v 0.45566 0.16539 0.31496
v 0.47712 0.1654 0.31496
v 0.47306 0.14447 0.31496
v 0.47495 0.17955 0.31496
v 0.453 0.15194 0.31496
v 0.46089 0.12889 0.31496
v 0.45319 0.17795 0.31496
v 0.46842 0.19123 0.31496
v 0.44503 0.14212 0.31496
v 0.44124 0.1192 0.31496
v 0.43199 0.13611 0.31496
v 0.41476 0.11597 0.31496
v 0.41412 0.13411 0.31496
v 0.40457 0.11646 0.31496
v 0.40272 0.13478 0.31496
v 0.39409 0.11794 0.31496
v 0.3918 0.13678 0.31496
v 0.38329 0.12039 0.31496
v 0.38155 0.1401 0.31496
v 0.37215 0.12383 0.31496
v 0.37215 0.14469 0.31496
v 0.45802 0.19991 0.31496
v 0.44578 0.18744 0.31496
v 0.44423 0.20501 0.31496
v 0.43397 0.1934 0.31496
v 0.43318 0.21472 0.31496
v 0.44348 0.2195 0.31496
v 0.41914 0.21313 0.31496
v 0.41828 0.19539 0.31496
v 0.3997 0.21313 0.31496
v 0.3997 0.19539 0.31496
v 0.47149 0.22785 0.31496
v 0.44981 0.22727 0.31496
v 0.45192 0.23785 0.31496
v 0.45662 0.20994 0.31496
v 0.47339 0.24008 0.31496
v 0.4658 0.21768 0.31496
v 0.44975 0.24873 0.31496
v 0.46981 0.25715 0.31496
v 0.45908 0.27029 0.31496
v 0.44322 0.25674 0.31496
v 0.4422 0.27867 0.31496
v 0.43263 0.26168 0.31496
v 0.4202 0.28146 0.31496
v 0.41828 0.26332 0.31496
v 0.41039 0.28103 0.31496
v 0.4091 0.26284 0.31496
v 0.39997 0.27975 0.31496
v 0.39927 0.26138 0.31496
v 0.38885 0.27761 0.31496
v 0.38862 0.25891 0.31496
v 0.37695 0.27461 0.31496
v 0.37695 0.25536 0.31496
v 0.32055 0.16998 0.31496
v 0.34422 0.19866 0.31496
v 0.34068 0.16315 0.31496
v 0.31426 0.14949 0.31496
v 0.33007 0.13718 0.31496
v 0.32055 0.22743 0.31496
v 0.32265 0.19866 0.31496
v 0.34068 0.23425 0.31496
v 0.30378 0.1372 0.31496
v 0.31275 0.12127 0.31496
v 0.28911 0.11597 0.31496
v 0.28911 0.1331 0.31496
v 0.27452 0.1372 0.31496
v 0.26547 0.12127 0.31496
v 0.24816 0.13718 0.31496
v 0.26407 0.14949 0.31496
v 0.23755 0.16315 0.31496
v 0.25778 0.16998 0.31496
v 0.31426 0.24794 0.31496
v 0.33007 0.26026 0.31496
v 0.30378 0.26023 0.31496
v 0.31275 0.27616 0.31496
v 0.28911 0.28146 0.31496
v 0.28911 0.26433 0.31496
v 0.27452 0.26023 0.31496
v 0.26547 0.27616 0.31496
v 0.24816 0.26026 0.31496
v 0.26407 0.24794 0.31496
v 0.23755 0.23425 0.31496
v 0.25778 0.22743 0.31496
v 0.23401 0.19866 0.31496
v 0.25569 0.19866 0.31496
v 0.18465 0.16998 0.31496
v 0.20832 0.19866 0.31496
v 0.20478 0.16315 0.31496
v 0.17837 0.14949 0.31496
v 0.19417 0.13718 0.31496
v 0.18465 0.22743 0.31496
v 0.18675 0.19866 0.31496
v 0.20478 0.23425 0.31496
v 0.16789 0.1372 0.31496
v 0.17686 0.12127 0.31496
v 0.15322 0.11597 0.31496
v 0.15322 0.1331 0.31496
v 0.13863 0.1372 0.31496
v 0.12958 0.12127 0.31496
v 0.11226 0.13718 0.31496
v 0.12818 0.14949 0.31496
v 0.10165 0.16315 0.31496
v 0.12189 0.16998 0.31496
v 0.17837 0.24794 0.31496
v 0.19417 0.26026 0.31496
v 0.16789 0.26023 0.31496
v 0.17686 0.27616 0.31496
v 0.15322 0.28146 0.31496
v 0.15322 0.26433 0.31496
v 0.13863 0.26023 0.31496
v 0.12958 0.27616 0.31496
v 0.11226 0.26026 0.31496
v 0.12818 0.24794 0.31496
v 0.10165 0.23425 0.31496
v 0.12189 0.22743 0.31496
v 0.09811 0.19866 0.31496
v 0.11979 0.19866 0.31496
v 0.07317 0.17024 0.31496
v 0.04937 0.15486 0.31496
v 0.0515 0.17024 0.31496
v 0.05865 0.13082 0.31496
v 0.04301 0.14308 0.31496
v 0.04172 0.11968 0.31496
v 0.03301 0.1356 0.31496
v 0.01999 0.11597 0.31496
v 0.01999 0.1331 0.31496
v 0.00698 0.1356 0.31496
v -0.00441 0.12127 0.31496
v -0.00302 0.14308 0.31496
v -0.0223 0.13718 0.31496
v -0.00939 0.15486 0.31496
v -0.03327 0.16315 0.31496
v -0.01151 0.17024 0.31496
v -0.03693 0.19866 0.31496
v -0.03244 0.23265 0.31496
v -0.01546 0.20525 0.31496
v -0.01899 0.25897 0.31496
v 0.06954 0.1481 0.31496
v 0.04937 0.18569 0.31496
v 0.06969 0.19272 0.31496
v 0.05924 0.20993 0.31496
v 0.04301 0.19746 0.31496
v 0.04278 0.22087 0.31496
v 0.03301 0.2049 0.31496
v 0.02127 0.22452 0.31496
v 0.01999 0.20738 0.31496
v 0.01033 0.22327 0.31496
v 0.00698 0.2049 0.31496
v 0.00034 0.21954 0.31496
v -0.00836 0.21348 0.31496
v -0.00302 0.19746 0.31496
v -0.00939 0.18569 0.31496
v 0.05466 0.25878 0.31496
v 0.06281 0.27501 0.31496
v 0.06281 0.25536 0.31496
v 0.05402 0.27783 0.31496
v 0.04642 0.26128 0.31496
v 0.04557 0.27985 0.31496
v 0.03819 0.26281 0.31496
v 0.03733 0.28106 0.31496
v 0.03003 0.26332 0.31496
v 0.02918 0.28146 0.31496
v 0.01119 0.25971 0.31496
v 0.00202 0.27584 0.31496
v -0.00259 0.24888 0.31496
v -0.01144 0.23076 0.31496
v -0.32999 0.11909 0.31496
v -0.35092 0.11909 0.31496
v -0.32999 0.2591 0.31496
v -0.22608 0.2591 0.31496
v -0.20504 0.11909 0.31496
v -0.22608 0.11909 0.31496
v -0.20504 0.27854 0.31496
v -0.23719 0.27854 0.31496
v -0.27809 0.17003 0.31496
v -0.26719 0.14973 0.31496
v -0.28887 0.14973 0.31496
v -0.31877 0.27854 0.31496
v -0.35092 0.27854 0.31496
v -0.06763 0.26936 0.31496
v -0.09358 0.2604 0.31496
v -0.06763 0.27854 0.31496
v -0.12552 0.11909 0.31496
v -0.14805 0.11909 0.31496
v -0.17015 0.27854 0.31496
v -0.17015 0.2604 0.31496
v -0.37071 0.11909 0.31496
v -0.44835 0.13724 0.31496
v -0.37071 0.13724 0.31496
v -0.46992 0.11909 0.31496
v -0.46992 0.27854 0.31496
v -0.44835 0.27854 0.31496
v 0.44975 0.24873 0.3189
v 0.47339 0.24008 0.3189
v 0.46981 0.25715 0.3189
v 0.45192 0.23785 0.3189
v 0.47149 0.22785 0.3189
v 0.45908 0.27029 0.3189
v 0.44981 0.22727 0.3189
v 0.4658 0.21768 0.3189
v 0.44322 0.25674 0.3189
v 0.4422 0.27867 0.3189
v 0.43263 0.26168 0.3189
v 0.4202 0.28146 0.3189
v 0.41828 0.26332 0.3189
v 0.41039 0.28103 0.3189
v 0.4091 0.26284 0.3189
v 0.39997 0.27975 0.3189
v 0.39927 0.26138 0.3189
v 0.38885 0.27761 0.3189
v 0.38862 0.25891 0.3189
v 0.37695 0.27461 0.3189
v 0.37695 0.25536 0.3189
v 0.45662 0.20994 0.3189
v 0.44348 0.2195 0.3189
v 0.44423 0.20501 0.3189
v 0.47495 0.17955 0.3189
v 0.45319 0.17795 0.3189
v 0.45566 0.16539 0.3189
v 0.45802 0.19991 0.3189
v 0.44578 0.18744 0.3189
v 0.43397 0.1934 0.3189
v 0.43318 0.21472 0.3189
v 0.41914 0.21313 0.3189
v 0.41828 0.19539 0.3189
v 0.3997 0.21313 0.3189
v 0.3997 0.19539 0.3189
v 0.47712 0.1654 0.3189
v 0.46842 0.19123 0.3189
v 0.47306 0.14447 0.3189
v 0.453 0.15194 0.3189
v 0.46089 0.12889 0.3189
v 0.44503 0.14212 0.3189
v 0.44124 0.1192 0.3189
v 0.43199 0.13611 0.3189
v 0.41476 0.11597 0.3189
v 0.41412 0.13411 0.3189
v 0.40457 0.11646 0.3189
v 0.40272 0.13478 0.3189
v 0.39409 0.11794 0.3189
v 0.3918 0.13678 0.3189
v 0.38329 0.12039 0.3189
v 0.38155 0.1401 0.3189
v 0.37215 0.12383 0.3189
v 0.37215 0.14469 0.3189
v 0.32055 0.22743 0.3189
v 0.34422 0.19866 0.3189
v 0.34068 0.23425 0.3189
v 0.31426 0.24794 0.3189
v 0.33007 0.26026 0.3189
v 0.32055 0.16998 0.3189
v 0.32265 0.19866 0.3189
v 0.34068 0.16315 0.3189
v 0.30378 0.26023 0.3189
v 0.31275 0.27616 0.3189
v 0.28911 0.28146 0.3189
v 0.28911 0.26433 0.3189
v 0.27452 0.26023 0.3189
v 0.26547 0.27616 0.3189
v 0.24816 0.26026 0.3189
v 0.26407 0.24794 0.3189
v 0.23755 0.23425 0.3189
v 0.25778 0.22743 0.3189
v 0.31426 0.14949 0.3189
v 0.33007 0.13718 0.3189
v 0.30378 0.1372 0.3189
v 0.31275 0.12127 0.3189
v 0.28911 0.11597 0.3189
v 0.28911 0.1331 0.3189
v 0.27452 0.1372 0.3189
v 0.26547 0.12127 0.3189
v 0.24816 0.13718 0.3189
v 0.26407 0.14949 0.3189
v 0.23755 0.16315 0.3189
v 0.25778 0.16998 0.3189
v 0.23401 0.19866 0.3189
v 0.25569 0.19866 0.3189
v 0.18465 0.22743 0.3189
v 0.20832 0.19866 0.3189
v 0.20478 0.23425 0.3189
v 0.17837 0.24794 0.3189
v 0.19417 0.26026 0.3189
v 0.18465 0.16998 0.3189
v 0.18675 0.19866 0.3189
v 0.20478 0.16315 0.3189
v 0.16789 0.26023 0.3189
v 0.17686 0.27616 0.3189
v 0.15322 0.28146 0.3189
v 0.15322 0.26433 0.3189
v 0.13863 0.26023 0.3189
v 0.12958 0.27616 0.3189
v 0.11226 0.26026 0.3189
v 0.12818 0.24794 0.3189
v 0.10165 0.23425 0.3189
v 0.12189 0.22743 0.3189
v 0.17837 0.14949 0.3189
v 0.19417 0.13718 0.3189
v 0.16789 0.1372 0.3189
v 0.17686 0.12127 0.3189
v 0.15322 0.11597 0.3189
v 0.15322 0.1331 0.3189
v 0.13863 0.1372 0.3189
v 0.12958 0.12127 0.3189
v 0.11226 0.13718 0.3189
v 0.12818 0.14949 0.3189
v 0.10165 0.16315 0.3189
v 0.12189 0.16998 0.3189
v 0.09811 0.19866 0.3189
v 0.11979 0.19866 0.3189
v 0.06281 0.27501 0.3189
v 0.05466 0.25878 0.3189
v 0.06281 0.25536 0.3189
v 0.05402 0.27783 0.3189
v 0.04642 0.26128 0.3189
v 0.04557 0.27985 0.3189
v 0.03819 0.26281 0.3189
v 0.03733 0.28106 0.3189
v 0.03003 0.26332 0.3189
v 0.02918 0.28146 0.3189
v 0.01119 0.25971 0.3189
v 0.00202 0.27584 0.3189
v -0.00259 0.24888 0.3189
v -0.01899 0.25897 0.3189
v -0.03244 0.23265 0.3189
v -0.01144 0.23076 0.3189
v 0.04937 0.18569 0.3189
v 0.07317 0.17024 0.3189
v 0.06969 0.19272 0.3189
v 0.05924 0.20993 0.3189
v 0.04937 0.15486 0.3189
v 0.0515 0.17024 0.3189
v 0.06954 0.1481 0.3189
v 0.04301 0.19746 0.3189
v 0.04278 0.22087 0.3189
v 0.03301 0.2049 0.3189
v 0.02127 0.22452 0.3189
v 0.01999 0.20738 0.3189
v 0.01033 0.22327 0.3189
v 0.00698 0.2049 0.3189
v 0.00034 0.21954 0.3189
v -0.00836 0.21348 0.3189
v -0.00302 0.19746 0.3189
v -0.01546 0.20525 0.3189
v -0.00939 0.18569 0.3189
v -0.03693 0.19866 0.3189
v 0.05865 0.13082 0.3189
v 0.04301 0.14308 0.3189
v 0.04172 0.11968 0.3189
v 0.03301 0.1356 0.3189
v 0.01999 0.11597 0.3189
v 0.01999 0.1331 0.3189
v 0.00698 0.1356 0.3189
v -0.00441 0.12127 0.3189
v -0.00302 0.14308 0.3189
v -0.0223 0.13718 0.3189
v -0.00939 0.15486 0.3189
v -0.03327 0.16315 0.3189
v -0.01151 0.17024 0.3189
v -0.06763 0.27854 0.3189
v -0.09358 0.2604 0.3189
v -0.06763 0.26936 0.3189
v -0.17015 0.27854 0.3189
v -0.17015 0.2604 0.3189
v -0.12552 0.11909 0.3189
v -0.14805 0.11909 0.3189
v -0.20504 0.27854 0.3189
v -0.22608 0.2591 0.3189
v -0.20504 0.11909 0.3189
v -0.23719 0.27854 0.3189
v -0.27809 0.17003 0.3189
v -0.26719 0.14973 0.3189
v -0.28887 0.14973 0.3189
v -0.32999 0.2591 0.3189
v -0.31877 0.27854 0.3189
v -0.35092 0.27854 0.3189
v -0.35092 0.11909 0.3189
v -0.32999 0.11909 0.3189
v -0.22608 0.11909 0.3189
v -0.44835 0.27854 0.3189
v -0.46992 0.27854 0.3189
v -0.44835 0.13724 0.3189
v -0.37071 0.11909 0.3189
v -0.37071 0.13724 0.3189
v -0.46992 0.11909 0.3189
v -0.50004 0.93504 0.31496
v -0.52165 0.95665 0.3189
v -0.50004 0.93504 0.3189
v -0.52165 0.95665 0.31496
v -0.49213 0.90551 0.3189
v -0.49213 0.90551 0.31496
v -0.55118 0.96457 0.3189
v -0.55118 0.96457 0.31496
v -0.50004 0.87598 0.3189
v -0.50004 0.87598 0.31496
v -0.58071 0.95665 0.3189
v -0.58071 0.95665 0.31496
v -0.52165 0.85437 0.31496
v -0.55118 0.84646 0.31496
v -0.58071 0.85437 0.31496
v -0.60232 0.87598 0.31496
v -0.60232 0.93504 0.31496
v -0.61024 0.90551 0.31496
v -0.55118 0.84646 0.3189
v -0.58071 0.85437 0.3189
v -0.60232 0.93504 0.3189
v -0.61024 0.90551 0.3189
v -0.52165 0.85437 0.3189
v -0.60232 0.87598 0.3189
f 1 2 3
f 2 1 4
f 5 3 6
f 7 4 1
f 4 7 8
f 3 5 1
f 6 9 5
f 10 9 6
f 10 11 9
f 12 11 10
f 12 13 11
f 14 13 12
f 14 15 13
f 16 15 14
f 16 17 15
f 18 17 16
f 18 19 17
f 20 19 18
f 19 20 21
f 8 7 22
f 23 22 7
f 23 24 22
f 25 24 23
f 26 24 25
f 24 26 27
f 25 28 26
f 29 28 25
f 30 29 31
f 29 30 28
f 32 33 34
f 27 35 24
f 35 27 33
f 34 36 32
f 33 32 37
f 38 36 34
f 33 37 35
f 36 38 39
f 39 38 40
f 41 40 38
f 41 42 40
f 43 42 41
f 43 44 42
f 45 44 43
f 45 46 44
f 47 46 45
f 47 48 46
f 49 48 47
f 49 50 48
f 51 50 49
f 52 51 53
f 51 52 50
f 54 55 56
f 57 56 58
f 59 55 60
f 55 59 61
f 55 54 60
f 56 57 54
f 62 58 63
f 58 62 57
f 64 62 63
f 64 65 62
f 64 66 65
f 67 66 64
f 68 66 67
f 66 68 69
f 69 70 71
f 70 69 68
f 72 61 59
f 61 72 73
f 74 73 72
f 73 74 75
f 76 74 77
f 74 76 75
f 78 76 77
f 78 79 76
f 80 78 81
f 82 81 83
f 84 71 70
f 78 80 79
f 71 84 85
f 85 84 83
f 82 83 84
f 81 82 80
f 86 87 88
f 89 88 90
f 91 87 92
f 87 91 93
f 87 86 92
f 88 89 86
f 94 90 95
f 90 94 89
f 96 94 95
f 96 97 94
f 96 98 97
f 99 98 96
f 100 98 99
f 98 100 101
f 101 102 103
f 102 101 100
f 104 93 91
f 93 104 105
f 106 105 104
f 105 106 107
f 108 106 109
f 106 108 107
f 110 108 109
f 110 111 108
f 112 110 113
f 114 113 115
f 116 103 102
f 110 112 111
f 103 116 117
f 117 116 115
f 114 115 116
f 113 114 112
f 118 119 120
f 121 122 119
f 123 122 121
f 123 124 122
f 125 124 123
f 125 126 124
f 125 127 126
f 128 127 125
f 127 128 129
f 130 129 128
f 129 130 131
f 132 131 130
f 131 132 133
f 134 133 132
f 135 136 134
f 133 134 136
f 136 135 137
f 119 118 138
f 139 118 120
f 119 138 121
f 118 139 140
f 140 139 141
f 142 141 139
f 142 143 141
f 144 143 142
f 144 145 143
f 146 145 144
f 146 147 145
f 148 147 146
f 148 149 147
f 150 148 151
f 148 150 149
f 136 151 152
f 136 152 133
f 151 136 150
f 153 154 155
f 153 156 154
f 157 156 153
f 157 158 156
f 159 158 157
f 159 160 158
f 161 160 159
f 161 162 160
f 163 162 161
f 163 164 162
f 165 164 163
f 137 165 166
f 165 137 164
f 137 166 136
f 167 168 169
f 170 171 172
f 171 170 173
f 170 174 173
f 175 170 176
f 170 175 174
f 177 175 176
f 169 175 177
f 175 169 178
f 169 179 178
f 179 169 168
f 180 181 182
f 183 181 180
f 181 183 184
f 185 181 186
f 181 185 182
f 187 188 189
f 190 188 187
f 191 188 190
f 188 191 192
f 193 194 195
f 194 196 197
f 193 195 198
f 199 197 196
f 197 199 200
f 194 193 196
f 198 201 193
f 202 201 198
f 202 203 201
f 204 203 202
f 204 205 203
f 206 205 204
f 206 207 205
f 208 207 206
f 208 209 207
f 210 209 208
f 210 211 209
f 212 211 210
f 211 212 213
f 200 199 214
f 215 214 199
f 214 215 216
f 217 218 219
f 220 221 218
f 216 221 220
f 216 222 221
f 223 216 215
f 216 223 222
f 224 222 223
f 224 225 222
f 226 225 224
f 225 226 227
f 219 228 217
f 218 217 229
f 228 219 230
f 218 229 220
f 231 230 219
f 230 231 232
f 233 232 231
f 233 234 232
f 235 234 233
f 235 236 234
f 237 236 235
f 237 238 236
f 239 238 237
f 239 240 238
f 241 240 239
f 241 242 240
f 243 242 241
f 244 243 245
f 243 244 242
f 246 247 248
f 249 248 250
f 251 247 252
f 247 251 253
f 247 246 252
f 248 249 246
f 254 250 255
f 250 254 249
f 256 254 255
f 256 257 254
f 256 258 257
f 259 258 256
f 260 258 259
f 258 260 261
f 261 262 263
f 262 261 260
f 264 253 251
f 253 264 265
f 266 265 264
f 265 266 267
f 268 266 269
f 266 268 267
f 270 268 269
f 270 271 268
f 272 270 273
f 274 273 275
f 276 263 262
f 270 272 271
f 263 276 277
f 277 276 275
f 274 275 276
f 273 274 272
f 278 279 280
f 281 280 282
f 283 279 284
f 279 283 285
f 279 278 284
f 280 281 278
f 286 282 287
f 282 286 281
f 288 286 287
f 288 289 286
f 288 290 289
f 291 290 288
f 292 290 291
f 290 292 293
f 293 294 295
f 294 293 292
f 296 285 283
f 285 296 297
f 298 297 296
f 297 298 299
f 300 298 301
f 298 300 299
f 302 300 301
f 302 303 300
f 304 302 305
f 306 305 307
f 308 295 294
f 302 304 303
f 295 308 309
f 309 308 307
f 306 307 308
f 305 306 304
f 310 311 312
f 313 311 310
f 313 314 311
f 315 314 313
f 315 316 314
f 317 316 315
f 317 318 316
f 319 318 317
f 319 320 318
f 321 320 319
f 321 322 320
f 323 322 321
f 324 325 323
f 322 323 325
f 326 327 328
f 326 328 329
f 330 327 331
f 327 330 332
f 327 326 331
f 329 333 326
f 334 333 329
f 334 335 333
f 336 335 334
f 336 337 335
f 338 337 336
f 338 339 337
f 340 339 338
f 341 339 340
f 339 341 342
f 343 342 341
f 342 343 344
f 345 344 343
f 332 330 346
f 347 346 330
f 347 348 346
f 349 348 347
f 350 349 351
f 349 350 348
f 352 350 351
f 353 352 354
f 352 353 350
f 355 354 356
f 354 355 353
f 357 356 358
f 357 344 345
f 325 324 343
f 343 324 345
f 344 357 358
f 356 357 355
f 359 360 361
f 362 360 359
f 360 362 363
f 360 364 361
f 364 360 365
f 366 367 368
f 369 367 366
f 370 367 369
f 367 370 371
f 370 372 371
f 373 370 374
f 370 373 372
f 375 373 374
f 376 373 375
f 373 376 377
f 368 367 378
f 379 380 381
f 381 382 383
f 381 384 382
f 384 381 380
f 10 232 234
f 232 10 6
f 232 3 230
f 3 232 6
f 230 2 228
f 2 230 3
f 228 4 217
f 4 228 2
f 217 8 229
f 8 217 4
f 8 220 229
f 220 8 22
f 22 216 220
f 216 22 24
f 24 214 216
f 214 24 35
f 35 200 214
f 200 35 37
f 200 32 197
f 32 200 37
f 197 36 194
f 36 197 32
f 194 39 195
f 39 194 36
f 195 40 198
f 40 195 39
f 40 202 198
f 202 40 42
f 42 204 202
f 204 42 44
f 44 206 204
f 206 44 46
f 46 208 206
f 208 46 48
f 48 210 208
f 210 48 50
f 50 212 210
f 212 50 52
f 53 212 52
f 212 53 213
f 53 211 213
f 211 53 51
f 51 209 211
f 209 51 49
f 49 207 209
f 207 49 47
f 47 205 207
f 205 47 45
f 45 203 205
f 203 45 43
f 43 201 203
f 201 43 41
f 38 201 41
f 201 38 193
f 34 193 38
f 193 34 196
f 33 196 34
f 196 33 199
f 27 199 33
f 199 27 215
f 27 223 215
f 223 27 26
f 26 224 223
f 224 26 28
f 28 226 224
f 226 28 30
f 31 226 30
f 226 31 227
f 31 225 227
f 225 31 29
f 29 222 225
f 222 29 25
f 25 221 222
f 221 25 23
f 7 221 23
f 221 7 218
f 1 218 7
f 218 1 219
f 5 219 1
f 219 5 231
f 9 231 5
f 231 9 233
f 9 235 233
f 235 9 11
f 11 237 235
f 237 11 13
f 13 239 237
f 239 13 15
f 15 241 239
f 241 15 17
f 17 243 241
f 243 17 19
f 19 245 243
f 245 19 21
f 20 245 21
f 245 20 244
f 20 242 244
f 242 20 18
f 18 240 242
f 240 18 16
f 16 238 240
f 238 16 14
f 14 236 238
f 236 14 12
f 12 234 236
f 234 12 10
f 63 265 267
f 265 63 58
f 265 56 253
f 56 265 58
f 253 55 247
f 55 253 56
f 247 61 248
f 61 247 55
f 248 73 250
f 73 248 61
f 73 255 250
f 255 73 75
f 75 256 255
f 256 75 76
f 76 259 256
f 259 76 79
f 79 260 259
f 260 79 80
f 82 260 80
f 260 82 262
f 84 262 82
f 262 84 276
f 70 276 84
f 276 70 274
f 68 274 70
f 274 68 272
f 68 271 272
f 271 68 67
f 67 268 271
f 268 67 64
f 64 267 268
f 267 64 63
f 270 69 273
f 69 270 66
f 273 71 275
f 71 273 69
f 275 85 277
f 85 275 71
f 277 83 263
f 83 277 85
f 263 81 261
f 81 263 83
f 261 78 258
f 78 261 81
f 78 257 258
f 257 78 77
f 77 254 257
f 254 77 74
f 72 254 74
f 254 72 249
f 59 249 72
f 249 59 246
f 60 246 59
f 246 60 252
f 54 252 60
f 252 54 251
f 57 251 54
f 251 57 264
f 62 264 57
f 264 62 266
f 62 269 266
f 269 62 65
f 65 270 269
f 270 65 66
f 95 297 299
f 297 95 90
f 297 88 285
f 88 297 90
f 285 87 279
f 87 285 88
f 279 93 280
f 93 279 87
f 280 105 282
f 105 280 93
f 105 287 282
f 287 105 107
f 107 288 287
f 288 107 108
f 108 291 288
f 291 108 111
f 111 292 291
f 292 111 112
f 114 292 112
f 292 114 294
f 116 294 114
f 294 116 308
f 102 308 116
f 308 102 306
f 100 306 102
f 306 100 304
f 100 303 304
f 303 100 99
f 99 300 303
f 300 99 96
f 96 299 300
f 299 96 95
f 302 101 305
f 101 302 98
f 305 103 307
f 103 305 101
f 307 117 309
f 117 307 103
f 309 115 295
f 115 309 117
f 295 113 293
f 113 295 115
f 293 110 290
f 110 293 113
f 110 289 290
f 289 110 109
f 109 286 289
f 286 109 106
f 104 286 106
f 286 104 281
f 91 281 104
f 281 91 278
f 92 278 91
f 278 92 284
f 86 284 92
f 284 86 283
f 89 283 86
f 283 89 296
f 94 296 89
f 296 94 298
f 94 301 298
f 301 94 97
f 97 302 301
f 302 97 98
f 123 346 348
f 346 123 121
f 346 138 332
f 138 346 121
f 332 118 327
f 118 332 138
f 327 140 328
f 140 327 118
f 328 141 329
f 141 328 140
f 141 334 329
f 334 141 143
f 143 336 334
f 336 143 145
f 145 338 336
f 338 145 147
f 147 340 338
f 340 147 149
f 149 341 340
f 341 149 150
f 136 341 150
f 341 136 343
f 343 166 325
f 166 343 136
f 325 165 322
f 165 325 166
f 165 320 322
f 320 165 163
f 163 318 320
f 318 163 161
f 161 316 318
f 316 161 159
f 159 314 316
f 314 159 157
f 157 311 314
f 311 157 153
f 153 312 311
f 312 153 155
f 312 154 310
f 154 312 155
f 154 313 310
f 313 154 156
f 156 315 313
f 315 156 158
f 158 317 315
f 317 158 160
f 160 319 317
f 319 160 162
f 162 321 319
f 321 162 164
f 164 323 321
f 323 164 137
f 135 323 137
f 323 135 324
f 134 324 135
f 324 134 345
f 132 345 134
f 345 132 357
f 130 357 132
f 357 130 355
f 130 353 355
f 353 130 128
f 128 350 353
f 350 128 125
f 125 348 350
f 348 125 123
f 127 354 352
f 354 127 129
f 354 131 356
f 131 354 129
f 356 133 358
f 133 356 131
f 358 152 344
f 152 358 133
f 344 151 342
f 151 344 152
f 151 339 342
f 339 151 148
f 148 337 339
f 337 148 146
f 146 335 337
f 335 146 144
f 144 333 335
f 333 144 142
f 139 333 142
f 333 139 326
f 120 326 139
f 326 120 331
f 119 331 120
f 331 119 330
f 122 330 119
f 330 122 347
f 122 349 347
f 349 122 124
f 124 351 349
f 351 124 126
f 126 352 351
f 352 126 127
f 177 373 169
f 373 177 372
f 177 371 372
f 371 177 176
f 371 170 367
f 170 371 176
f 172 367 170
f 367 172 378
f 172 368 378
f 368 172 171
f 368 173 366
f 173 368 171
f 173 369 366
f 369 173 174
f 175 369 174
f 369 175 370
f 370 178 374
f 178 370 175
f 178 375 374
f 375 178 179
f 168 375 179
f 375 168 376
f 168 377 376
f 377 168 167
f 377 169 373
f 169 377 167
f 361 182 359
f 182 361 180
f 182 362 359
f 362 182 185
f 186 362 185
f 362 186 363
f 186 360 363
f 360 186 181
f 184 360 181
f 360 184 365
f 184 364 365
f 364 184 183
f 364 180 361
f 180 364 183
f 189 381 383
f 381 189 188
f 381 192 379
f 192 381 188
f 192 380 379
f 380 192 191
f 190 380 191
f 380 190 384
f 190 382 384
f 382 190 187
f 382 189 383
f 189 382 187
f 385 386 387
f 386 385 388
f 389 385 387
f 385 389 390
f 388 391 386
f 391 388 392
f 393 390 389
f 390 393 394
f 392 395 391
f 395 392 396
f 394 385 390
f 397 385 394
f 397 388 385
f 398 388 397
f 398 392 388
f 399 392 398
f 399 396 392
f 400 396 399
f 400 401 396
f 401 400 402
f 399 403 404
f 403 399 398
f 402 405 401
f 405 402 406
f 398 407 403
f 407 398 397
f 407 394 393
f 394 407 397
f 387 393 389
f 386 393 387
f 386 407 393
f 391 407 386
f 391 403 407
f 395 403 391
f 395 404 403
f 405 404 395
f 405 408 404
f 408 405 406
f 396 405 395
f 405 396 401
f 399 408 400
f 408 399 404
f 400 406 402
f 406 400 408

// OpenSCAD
// file: defines.scad
scale = 1/2.54;

N = 44;
ND = 12;
NE = 10;
e = 0.50;
A = 0.80;   // 0.80..1.00
A1 = 0.05;  // 0.025..0.075
E = 6.00;
E2 = 4.55;  // 4.40..4.70
D = 6.00;
D2 = 4.55;  // 4.40..4.70
b = 0.25;   // 0.20..0.30
L = 0.25;   // 0.20..0.30
K = 0.20;   //
// main file
include <defines.scad>

/*font = "Liberation Sans";*/
font = "DejaVu";
/*font = "Abyssinica SIL";*/

f_x = -1.1;
f_y = 0.6;
f_dy = -0.6;
fscale = 0.04;
lab_h = 0.01;

// Label
scale(scale) color("White") translate([0, 0, A]) rotate([0,0,0]) {

  translate([0,  0.5, 0]) scale([fscale, fscale, 1]) {
    linear_extrude(height=lab_h, center=false) {
      text("LM76003", font=font, valign="center", halign="center", $fn=8);
    }
  }

  /* translate([0, -0.5, 0]) scale([fscale, fscale, 1]) {
    linear_extrude(height=lab_h, center=false) {
      text("Texas Instruments", font=font, valign="center", halign="center", $fn=8);
    }
  } */

  translate([-1.4, 2.3, 0]) {
    cylinder(r = 0.15, h = lab_h, $fn = 12);
  }

}
